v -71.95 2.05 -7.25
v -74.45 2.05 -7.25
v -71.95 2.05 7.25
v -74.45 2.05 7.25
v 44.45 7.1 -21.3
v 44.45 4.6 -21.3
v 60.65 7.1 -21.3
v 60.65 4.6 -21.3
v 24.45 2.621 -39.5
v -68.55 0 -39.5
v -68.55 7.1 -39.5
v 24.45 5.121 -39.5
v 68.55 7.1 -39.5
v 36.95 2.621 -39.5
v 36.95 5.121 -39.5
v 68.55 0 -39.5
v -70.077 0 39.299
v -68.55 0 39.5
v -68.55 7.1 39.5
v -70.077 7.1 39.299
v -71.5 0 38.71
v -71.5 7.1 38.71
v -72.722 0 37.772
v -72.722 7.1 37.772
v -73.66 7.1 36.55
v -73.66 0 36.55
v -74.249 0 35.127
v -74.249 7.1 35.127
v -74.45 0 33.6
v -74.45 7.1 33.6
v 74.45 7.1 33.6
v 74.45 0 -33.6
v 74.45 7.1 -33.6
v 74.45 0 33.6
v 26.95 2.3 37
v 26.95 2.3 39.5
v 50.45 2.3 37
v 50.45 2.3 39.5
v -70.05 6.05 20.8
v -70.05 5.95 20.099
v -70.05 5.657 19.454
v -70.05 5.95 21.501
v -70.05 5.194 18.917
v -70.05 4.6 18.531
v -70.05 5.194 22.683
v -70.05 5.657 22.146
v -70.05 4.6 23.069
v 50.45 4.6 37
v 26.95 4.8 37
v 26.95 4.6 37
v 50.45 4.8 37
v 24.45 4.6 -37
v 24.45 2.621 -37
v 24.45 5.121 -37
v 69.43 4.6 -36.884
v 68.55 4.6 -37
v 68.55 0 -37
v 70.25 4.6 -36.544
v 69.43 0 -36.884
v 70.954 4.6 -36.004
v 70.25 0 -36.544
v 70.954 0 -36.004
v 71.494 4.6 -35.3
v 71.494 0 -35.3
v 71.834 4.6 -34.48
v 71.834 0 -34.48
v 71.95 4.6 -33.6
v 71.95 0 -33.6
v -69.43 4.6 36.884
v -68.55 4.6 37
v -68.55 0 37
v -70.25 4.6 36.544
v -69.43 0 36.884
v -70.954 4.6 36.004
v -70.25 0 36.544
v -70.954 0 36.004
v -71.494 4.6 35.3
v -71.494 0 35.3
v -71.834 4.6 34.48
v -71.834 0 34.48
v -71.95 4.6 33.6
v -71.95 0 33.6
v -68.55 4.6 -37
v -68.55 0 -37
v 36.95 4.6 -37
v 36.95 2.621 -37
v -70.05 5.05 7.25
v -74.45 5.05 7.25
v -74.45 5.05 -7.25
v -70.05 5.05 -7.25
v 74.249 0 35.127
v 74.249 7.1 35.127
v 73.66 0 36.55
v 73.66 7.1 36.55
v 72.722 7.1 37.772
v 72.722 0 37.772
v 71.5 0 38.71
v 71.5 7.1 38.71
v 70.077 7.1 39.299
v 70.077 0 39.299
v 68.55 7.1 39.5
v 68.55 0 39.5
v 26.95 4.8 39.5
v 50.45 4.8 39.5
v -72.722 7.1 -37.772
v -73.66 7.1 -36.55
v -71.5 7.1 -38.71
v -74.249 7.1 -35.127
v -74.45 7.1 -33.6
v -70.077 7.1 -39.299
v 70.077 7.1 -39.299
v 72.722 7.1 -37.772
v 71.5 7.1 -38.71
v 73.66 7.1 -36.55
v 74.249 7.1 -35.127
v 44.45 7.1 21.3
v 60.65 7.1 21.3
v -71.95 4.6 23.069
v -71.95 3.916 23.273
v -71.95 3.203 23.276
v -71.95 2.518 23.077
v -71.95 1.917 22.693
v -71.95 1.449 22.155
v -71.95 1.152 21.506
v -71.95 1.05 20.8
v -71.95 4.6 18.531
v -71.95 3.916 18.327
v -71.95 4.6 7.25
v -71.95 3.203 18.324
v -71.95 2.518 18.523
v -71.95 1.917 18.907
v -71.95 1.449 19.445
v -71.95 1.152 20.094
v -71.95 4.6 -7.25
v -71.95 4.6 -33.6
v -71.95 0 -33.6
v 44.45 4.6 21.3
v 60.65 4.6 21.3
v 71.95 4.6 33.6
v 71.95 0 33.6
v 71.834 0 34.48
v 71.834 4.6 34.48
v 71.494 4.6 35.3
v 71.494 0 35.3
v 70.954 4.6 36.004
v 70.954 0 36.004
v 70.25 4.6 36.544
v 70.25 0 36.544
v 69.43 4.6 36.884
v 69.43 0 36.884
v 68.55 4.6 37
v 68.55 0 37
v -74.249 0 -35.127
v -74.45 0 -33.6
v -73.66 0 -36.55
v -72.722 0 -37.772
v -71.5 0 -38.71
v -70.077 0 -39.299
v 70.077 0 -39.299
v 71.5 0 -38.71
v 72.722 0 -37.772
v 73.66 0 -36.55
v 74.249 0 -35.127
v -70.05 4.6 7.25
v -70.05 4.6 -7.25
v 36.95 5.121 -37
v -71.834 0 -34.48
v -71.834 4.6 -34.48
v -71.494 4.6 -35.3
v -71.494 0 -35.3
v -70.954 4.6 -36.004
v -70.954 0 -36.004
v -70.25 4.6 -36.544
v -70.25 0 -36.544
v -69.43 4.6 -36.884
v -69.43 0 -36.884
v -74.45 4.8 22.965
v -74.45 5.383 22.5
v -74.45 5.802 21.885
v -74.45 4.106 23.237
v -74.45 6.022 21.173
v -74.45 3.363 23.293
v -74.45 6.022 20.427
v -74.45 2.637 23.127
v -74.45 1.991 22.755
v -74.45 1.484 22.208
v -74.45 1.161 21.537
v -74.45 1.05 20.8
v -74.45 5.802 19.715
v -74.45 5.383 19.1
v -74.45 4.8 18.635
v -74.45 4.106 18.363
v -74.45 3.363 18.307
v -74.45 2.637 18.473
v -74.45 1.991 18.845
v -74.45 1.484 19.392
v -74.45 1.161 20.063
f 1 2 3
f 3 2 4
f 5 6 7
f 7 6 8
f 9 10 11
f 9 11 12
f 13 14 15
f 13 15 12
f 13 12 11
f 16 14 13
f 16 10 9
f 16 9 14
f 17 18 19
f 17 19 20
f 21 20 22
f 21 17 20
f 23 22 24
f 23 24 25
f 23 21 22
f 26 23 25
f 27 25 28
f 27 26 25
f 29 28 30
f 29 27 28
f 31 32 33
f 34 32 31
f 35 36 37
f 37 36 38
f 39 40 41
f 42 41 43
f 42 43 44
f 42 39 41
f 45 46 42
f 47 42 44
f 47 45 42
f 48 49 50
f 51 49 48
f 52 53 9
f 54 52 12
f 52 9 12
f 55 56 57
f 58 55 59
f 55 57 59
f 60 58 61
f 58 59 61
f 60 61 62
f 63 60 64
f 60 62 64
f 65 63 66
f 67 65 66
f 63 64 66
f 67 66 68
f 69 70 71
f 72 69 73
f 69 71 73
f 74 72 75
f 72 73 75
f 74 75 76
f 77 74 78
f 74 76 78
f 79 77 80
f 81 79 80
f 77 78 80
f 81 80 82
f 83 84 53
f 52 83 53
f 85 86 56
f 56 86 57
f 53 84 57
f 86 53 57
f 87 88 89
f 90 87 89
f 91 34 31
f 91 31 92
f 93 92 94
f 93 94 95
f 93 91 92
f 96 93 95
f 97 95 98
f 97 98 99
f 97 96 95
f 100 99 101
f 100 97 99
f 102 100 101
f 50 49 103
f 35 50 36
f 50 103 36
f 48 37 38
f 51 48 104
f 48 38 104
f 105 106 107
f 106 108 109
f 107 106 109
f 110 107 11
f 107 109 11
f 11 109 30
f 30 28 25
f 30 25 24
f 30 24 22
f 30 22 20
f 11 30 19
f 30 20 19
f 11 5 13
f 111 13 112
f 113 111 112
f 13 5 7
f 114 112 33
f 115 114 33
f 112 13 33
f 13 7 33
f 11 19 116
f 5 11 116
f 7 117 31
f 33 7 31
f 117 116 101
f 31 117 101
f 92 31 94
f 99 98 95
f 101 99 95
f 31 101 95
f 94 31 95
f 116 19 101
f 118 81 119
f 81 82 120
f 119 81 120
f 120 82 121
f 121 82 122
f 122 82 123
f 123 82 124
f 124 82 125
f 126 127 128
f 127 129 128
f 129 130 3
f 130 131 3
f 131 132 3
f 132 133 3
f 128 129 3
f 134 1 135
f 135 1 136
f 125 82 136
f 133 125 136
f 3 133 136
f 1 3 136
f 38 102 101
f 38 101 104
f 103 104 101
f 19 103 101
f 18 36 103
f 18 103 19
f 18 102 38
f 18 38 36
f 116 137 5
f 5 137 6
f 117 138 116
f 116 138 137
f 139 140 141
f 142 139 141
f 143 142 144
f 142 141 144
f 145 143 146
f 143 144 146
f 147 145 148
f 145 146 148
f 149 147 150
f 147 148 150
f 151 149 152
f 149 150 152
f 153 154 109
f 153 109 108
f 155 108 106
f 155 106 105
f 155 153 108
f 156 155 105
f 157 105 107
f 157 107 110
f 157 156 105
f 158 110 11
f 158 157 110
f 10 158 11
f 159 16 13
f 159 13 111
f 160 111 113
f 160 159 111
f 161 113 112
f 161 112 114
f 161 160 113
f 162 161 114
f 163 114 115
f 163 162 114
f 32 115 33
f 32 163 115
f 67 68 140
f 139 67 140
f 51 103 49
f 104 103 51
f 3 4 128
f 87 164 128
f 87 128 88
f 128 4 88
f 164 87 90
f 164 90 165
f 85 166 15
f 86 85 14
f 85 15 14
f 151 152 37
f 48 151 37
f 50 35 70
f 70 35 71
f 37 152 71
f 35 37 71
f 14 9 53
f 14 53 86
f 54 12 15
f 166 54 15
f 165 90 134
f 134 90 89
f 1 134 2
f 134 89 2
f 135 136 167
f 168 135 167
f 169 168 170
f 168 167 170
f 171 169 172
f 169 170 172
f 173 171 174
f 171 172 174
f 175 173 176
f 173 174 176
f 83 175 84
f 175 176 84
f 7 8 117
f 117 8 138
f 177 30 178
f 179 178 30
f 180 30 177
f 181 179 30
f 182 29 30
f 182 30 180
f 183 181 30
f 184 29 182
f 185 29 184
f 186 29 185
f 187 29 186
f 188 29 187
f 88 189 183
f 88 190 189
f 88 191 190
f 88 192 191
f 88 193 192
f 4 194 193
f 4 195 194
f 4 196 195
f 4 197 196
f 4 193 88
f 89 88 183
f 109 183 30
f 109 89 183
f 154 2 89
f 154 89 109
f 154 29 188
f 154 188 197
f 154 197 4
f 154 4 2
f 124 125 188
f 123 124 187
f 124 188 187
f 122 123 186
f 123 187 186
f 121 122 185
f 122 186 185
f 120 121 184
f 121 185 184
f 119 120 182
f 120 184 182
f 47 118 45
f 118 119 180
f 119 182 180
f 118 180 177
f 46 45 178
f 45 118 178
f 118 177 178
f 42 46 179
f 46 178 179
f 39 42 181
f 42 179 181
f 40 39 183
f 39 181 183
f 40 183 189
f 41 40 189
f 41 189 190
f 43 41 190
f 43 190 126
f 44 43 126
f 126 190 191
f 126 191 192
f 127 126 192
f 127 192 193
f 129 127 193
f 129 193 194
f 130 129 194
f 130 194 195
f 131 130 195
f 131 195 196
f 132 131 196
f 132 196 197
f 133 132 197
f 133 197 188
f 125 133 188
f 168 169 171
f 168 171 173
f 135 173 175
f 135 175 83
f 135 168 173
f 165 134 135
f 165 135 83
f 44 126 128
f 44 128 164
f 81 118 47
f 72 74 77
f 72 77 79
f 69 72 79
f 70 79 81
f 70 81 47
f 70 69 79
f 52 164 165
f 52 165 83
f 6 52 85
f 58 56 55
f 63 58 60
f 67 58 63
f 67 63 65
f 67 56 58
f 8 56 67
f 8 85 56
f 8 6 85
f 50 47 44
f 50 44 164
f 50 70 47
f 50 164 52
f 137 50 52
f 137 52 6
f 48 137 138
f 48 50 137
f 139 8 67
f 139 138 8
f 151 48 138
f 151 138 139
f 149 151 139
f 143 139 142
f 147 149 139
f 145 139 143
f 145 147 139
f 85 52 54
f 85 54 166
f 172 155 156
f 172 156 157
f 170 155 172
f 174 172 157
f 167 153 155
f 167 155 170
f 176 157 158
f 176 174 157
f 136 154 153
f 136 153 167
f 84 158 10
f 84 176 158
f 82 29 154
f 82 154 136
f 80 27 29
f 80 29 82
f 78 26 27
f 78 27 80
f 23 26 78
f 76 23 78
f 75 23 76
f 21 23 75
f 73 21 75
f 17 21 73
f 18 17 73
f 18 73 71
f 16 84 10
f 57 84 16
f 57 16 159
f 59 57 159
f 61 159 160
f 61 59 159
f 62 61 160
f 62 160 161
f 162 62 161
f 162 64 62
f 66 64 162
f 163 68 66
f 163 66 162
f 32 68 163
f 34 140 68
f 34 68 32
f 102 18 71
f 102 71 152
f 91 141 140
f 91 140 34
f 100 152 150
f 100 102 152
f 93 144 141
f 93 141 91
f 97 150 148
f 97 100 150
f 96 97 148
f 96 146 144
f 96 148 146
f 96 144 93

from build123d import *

# Parameters (mm, degrees)
F1_DEPTH  = 7.1
F2_T      = -2.5
F4_DEPTH  = 25
F5_W      = 12.5
F5_H      = 1.25
F6_DEPTH  = 2.5
F7_W      = 23.5
F7_H      = 1.25
F8_DEPTH  = 2.5
F9_W      = 1.5
F9_H      = 7.25
F9_R      = 2.5
F10_DEPTH = 4.4


with BuildPart() as f1:
    # F0 (on Front) → F1 (new body)
    with BuildSketch(Plane.XZ):
        with BuildLine():
            Line((68.55, 39.5), (-68.55, 39.5))
            ThreePointArc((-68.55, 39.5), (-72.72193, 37.77193), (-74.45, 33.6))
            Line((-74.45, 33.6), (-74.45, -33.6))
            ThreePointArc((-74.45, -33.6), (-72.72193, -37.77193), (-68.55, -39.5))
            Line((-68.55, -39.5), (68.55, -39.5))
            ThreePointArc((68.55, -39.5), (72.72193, -37.77193), (74.45, -33.6))
            Line((74.45, -33.6), (74.45, 33.6))
            ThreePointArc((74.45, 33.6), (72.72193, 37.77193), (68.55, 39.5))
        make_face()
    extrude(amount=-F1_DEPTH)

    # F2
    f2_openings = [f1.faces().sort_by_distance(p)[0] for p in [
        (0, 0, 0),
    ]]
    offset(amount=F2_T, openings=f2_openings)

    # F3 (on Front) → F4 (cut)
    with BuildSketch(Plane.XZ):
        Polygon((60.65, 21.3), (44.45, 21.3), (44.45, 0), (44.45, -21.3), (60.65, -21.3), (60.65, 0), align=None)
    extrude(amount=-F4_DEPTH, mode=Mode.SUBTRACT)

    # F5 (on face) → F6 (cut)
    with BuildSketch(Plane(origin=(0, 0, -39.5), x_dir=(1, 0, 0), z_dir=(0, 0, -1))):
        with Locations((30.7, -3.245512)):
            Rectangle(F5_W, F5_H)
        with Locations((30.7, -4.495512)):
            Rectangle(F5_W, F5_H)
    extrude(amount=-F6_DEPTH, mode=Mode.SUBTRACT)

    # F7 (on face) → F8 (cut)
    with BuildSketch(Plane.XY.offset(39.5)):
        with Locations((38.7, 2.925)):
            Rectangle(F7_W, F7_H)
        with Locations((38.7, 4.175)):
            Rectangle(F7_W, F7_H)
    extrude(amount=-F8_DEPTH, mode=Mode.SUBTRACT)

    # F9 (on face) → F10 (cut)
    with BuildSketch(Plane(origin=(-74.45, 0, 0), x_dir=(0, -1, 0), z_dir=(-1, 0, 0))):
        with Locations((-4.3, -3.625)):
            Rectangle(F9_W, F9_H)
        with Locations((-2.8, -3.625)):
            Rectangle(F9_W, F9_H)
        Polygon((-3.55, 0), (-2.05, 0), (-2.05, 7.25), (-3.55, 7.25), (-5.05, 7.25), (-5.05, 0), align=None)
        with Locations((-3.55, 20.8)):
            Circle(F9_R)
    extrude(amount=-F10_DEPTH, mode=Mode.SUBTRACT)


solid = f1.part
